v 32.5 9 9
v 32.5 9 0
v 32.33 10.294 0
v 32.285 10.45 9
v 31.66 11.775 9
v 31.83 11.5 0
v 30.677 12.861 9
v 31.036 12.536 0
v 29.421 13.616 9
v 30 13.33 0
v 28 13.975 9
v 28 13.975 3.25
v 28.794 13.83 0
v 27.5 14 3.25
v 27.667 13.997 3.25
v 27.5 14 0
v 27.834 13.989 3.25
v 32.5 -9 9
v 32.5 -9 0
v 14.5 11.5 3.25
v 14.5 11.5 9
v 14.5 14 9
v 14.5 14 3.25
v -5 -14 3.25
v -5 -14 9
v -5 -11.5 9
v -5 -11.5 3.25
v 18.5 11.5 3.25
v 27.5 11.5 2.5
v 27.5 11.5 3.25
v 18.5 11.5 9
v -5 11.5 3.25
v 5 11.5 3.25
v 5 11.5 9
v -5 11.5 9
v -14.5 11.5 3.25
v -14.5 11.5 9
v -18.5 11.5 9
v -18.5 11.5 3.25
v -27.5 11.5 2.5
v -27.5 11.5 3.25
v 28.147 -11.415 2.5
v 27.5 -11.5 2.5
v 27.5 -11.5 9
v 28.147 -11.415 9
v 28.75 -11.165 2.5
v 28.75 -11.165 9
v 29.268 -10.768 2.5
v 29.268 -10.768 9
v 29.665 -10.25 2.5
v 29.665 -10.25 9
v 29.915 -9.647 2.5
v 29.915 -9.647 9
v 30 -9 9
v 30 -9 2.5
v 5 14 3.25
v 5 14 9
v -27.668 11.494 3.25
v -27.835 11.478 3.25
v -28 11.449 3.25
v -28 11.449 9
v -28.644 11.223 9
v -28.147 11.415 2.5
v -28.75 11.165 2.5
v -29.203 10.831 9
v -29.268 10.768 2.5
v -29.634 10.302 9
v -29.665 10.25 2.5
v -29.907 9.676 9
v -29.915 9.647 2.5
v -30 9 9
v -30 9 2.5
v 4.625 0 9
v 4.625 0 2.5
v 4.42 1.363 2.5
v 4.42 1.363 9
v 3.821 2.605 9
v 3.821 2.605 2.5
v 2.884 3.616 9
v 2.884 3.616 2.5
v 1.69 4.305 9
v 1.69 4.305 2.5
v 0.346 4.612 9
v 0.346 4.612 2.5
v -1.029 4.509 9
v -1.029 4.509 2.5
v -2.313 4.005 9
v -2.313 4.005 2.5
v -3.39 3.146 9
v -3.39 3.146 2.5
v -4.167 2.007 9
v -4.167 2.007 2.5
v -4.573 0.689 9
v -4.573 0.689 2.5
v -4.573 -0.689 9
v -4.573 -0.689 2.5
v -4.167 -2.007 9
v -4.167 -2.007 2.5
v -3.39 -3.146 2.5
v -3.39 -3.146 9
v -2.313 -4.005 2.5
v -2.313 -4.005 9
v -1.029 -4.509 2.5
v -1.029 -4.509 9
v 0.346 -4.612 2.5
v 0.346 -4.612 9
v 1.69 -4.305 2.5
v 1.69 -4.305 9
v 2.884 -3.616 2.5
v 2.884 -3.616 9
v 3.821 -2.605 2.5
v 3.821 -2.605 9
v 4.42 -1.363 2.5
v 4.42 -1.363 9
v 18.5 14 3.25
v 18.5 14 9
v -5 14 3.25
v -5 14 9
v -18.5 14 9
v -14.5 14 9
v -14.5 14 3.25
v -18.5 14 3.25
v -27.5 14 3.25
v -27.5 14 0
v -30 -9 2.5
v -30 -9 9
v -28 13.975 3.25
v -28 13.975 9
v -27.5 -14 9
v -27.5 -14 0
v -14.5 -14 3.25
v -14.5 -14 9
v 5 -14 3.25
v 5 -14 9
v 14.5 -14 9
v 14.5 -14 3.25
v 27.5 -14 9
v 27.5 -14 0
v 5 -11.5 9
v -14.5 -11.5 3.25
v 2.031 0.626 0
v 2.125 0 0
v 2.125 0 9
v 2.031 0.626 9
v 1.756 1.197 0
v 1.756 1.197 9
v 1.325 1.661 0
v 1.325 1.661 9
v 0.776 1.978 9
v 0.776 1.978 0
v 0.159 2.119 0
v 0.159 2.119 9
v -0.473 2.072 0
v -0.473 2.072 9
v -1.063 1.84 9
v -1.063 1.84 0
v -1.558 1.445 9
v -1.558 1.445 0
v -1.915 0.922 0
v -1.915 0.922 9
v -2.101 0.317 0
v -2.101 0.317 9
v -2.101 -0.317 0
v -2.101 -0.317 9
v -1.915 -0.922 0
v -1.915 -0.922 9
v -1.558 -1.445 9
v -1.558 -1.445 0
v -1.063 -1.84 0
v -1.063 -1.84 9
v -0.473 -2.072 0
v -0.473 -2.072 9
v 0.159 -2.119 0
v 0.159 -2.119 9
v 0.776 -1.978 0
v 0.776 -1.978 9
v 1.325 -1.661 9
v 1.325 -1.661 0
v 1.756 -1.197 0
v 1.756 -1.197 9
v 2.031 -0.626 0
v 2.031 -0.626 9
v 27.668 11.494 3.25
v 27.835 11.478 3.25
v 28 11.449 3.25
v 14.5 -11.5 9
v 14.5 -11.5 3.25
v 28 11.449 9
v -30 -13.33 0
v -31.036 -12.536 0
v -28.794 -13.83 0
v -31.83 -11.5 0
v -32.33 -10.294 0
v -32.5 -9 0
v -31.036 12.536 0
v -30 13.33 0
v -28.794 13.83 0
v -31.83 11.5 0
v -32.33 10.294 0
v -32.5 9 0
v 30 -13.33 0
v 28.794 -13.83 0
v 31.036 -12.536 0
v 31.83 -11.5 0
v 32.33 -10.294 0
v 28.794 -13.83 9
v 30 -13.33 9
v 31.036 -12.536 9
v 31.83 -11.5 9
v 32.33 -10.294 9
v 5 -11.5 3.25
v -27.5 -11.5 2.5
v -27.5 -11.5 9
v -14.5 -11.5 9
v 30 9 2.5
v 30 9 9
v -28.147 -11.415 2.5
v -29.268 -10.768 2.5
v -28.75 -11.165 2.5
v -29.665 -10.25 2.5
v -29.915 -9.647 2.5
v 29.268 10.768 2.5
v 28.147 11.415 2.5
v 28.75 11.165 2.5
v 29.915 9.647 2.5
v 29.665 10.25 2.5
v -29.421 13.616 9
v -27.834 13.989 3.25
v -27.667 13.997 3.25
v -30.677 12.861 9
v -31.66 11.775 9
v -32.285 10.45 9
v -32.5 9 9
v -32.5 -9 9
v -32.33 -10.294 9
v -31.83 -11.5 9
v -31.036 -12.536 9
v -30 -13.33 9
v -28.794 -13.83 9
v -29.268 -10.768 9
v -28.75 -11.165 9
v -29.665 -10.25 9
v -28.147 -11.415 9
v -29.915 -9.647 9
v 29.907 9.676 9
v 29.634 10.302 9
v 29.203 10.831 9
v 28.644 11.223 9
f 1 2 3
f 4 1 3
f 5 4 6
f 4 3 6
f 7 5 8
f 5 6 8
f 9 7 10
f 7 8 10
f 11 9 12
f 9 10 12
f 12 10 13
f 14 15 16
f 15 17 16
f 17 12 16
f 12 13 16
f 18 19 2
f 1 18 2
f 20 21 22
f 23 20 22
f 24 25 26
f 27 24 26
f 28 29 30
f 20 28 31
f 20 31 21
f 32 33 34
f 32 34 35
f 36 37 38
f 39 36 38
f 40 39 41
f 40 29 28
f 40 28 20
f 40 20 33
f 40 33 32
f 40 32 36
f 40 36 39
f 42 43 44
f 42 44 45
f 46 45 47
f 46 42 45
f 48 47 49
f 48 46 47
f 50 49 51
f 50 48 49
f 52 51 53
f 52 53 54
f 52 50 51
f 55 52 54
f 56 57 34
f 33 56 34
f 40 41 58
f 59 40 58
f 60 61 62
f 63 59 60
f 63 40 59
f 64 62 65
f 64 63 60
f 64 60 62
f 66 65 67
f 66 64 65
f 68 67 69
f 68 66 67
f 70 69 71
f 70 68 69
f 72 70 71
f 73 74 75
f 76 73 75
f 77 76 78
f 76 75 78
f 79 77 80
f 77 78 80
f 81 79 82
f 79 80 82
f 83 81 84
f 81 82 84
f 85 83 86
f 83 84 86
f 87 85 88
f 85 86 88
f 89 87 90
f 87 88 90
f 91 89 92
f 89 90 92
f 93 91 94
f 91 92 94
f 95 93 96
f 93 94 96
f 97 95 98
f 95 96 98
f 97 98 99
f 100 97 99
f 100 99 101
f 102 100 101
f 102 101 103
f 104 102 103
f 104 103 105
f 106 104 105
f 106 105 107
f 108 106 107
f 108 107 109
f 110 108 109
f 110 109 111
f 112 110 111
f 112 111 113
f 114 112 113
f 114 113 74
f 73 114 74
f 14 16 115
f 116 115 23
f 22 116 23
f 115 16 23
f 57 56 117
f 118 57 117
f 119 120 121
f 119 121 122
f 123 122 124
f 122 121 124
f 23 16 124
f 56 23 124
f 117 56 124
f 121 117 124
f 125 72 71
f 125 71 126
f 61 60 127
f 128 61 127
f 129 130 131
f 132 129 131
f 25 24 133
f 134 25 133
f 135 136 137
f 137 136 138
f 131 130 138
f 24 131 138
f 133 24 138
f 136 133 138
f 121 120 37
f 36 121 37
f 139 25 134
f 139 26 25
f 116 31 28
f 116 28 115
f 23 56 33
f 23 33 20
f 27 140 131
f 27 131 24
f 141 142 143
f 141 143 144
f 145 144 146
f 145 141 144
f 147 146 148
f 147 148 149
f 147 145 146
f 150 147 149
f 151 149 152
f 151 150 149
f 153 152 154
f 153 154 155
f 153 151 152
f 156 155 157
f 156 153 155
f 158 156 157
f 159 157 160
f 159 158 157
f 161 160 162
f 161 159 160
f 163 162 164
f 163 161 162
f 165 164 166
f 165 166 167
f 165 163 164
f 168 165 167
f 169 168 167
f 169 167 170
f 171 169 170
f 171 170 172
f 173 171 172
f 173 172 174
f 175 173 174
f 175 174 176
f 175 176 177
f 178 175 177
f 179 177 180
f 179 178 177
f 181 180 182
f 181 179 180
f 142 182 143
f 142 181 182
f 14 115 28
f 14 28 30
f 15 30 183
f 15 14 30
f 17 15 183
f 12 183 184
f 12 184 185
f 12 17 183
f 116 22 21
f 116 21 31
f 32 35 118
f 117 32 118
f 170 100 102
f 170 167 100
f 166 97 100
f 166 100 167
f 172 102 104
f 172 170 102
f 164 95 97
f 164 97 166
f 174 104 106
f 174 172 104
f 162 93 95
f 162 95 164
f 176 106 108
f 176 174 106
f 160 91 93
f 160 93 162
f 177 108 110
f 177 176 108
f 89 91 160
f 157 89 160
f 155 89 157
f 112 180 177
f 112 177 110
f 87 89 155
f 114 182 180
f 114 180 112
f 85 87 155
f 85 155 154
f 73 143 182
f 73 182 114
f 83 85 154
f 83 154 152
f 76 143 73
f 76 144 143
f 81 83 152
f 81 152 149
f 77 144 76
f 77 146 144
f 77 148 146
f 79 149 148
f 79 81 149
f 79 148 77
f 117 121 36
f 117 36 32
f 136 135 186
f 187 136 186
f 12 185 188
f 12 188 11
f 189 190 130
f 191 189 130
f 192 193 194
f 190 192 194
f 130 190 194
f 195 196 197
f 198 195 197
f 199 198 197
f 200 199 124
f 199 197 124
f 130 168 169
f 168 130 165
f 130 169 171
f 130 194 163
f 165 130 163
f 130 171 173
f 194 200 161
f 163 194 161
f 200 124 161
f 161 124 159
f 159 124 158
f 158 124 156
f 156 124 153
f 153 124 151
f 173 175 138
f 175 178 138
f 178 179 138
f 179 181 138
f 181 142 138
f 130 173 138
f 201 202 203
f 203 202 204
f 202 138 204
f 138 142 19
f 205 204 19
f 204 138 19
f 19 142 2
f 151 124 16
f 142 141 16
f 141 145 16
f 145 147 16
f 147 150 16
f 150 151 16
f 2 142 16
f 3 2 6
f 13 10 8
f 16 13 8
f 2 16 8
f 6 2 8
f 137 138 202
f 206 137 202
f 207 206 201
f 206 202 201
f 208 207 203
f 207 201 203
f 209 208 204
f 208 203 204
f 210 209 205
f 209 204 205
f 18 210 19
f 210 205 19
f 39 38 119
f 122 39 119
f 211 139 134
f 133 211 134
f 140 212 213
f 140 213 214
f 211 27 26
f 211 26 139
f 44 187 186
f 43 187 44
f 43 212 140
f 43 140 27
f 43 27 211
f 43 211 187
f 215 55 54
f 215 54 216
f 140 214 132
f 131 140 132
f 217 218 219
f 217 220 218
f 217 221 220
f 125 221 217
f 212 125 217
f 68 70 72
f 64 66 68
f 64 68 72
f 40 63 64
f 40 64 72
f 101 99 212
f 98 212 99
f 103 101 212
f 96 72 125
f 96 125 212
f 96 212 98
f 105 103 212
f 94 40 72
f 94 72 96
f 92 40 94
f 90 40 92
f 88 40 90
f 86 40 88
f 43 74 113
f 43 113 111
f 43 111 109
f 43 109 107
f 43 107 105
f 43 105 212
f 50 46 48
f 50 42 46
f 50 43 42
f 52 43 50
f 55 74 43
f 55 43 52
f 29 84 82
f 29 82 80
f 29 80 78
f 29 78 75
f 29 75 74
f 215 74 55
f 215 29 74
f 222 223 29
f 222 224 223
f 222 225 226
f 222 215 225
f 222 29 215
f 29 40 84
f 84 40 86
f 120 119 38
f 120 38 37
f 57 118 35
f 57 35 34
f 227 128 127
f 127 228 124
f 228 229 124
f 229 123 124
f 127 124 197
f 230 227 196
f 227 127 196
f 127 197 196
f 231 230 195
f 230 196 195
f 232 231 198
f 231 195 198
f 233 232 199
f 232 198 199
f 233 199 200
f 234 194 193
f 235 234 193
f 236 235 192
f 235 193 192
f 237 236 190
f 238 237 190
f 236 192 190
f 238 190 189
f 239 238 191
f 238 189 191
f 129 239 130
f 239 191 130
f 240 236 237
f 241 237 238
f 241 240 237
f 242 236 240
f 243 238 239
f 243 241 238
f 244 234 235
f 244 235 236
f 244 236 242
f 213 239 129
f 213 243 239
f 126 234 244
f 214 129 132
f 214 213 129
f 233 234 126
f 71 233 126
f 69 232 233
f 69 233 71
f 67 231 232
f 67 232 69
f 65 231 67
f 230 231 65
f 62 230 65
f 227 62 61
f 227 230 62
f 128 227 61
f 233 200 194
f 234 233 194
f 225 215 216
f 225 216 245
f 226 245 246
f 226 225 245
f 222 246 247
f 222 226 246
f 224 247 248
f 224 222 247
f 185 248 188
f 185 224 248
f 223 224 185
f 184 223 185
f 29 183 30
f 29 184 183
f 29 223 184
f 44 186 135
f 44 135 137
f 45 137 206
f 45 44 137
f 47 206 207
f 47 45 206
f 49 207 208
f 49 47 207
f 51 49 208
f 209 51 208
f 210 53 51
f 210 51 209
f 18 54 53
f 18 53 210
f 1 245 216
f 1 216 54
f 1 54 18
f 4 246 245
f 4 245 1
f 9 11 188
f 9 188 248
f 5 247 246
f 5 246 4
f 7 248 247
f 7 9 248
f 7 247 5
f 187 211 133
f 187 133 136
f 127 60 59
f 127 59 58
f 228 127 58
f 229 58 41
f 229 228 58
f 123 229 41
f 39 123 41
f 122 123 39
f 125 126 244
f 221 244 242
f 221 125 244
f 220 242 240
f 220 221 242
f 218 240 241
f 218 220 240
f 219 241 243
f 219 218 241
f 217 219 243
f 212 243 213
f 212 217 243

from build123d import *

# Parameters (mm, degrees)
F0_R     = 2.125
F1_DEPTH = 9
F2_T     = -2.5
F3_W     = 9.5
F3_H     = 14
F4_DEPTH = 5.75


with BuildPart() as f1:
    # F0 (on Top) → F1 (new body)
    with BuildSketch(Plane.XY):
        with BuildLine():
            ThreePointArc((32.5, 9), (31.035534, 12.535534), (27.5, 14))
            Line((27.5, 14), (-27.5, 14))
            ThreePointArc((-27.5, 14), (-31.035534, 12.535534), (-32.5, 9))
            Line((-32.5, 9), (-32.5, -9))
            ThreePointArc((-32.5, -9), (-31.035534, -12.535534), (-27.5, -14))
            Line((-27.5, -14), (27.5, -14))
            ThreePointArc((27.5, -14), (31.035534, -12.535534), (32.5, -9))
            Line((32.5, -9), (32.5, 9))
        make_face()
        Circle(F0_R, mode=Mode.SUBTRACT)
    extrude(amount=F1_DEPTH)

    # F2
    f2_openings = [f1.faces().sort_by_distance(p)[0] for p in [
        (30.535084, 12.035084, 9),
    ]]
    offset(amount=F2_T, openings=f2_openings)

    # F3 (on face) → F4 (cut)
    with BuildSketch(Plane.XY.offset(9)):
        with Locations((9.75, 7)):
            Rectangle(F3_W, F3_H)
        with Locations((9.75, -7)):
            Rectangle(F3_W, F3_H)
        with Locations((-9.75, -7)):
            Rectangle(F3_W, F3_H)
        with Locations((-9.75, 7)):
            Rectangle(F3_W, F3_H)
        with Locations((23.25, 7)):
            Rectangle(F3_W, F3_H)
        with Locations((-23.25, 7)):
            Rectangle(F3_W, F3_H)
    extrude(amount=-F4_DEPTH, mode=Mode.SUBTRACT)


solid = f1.part
